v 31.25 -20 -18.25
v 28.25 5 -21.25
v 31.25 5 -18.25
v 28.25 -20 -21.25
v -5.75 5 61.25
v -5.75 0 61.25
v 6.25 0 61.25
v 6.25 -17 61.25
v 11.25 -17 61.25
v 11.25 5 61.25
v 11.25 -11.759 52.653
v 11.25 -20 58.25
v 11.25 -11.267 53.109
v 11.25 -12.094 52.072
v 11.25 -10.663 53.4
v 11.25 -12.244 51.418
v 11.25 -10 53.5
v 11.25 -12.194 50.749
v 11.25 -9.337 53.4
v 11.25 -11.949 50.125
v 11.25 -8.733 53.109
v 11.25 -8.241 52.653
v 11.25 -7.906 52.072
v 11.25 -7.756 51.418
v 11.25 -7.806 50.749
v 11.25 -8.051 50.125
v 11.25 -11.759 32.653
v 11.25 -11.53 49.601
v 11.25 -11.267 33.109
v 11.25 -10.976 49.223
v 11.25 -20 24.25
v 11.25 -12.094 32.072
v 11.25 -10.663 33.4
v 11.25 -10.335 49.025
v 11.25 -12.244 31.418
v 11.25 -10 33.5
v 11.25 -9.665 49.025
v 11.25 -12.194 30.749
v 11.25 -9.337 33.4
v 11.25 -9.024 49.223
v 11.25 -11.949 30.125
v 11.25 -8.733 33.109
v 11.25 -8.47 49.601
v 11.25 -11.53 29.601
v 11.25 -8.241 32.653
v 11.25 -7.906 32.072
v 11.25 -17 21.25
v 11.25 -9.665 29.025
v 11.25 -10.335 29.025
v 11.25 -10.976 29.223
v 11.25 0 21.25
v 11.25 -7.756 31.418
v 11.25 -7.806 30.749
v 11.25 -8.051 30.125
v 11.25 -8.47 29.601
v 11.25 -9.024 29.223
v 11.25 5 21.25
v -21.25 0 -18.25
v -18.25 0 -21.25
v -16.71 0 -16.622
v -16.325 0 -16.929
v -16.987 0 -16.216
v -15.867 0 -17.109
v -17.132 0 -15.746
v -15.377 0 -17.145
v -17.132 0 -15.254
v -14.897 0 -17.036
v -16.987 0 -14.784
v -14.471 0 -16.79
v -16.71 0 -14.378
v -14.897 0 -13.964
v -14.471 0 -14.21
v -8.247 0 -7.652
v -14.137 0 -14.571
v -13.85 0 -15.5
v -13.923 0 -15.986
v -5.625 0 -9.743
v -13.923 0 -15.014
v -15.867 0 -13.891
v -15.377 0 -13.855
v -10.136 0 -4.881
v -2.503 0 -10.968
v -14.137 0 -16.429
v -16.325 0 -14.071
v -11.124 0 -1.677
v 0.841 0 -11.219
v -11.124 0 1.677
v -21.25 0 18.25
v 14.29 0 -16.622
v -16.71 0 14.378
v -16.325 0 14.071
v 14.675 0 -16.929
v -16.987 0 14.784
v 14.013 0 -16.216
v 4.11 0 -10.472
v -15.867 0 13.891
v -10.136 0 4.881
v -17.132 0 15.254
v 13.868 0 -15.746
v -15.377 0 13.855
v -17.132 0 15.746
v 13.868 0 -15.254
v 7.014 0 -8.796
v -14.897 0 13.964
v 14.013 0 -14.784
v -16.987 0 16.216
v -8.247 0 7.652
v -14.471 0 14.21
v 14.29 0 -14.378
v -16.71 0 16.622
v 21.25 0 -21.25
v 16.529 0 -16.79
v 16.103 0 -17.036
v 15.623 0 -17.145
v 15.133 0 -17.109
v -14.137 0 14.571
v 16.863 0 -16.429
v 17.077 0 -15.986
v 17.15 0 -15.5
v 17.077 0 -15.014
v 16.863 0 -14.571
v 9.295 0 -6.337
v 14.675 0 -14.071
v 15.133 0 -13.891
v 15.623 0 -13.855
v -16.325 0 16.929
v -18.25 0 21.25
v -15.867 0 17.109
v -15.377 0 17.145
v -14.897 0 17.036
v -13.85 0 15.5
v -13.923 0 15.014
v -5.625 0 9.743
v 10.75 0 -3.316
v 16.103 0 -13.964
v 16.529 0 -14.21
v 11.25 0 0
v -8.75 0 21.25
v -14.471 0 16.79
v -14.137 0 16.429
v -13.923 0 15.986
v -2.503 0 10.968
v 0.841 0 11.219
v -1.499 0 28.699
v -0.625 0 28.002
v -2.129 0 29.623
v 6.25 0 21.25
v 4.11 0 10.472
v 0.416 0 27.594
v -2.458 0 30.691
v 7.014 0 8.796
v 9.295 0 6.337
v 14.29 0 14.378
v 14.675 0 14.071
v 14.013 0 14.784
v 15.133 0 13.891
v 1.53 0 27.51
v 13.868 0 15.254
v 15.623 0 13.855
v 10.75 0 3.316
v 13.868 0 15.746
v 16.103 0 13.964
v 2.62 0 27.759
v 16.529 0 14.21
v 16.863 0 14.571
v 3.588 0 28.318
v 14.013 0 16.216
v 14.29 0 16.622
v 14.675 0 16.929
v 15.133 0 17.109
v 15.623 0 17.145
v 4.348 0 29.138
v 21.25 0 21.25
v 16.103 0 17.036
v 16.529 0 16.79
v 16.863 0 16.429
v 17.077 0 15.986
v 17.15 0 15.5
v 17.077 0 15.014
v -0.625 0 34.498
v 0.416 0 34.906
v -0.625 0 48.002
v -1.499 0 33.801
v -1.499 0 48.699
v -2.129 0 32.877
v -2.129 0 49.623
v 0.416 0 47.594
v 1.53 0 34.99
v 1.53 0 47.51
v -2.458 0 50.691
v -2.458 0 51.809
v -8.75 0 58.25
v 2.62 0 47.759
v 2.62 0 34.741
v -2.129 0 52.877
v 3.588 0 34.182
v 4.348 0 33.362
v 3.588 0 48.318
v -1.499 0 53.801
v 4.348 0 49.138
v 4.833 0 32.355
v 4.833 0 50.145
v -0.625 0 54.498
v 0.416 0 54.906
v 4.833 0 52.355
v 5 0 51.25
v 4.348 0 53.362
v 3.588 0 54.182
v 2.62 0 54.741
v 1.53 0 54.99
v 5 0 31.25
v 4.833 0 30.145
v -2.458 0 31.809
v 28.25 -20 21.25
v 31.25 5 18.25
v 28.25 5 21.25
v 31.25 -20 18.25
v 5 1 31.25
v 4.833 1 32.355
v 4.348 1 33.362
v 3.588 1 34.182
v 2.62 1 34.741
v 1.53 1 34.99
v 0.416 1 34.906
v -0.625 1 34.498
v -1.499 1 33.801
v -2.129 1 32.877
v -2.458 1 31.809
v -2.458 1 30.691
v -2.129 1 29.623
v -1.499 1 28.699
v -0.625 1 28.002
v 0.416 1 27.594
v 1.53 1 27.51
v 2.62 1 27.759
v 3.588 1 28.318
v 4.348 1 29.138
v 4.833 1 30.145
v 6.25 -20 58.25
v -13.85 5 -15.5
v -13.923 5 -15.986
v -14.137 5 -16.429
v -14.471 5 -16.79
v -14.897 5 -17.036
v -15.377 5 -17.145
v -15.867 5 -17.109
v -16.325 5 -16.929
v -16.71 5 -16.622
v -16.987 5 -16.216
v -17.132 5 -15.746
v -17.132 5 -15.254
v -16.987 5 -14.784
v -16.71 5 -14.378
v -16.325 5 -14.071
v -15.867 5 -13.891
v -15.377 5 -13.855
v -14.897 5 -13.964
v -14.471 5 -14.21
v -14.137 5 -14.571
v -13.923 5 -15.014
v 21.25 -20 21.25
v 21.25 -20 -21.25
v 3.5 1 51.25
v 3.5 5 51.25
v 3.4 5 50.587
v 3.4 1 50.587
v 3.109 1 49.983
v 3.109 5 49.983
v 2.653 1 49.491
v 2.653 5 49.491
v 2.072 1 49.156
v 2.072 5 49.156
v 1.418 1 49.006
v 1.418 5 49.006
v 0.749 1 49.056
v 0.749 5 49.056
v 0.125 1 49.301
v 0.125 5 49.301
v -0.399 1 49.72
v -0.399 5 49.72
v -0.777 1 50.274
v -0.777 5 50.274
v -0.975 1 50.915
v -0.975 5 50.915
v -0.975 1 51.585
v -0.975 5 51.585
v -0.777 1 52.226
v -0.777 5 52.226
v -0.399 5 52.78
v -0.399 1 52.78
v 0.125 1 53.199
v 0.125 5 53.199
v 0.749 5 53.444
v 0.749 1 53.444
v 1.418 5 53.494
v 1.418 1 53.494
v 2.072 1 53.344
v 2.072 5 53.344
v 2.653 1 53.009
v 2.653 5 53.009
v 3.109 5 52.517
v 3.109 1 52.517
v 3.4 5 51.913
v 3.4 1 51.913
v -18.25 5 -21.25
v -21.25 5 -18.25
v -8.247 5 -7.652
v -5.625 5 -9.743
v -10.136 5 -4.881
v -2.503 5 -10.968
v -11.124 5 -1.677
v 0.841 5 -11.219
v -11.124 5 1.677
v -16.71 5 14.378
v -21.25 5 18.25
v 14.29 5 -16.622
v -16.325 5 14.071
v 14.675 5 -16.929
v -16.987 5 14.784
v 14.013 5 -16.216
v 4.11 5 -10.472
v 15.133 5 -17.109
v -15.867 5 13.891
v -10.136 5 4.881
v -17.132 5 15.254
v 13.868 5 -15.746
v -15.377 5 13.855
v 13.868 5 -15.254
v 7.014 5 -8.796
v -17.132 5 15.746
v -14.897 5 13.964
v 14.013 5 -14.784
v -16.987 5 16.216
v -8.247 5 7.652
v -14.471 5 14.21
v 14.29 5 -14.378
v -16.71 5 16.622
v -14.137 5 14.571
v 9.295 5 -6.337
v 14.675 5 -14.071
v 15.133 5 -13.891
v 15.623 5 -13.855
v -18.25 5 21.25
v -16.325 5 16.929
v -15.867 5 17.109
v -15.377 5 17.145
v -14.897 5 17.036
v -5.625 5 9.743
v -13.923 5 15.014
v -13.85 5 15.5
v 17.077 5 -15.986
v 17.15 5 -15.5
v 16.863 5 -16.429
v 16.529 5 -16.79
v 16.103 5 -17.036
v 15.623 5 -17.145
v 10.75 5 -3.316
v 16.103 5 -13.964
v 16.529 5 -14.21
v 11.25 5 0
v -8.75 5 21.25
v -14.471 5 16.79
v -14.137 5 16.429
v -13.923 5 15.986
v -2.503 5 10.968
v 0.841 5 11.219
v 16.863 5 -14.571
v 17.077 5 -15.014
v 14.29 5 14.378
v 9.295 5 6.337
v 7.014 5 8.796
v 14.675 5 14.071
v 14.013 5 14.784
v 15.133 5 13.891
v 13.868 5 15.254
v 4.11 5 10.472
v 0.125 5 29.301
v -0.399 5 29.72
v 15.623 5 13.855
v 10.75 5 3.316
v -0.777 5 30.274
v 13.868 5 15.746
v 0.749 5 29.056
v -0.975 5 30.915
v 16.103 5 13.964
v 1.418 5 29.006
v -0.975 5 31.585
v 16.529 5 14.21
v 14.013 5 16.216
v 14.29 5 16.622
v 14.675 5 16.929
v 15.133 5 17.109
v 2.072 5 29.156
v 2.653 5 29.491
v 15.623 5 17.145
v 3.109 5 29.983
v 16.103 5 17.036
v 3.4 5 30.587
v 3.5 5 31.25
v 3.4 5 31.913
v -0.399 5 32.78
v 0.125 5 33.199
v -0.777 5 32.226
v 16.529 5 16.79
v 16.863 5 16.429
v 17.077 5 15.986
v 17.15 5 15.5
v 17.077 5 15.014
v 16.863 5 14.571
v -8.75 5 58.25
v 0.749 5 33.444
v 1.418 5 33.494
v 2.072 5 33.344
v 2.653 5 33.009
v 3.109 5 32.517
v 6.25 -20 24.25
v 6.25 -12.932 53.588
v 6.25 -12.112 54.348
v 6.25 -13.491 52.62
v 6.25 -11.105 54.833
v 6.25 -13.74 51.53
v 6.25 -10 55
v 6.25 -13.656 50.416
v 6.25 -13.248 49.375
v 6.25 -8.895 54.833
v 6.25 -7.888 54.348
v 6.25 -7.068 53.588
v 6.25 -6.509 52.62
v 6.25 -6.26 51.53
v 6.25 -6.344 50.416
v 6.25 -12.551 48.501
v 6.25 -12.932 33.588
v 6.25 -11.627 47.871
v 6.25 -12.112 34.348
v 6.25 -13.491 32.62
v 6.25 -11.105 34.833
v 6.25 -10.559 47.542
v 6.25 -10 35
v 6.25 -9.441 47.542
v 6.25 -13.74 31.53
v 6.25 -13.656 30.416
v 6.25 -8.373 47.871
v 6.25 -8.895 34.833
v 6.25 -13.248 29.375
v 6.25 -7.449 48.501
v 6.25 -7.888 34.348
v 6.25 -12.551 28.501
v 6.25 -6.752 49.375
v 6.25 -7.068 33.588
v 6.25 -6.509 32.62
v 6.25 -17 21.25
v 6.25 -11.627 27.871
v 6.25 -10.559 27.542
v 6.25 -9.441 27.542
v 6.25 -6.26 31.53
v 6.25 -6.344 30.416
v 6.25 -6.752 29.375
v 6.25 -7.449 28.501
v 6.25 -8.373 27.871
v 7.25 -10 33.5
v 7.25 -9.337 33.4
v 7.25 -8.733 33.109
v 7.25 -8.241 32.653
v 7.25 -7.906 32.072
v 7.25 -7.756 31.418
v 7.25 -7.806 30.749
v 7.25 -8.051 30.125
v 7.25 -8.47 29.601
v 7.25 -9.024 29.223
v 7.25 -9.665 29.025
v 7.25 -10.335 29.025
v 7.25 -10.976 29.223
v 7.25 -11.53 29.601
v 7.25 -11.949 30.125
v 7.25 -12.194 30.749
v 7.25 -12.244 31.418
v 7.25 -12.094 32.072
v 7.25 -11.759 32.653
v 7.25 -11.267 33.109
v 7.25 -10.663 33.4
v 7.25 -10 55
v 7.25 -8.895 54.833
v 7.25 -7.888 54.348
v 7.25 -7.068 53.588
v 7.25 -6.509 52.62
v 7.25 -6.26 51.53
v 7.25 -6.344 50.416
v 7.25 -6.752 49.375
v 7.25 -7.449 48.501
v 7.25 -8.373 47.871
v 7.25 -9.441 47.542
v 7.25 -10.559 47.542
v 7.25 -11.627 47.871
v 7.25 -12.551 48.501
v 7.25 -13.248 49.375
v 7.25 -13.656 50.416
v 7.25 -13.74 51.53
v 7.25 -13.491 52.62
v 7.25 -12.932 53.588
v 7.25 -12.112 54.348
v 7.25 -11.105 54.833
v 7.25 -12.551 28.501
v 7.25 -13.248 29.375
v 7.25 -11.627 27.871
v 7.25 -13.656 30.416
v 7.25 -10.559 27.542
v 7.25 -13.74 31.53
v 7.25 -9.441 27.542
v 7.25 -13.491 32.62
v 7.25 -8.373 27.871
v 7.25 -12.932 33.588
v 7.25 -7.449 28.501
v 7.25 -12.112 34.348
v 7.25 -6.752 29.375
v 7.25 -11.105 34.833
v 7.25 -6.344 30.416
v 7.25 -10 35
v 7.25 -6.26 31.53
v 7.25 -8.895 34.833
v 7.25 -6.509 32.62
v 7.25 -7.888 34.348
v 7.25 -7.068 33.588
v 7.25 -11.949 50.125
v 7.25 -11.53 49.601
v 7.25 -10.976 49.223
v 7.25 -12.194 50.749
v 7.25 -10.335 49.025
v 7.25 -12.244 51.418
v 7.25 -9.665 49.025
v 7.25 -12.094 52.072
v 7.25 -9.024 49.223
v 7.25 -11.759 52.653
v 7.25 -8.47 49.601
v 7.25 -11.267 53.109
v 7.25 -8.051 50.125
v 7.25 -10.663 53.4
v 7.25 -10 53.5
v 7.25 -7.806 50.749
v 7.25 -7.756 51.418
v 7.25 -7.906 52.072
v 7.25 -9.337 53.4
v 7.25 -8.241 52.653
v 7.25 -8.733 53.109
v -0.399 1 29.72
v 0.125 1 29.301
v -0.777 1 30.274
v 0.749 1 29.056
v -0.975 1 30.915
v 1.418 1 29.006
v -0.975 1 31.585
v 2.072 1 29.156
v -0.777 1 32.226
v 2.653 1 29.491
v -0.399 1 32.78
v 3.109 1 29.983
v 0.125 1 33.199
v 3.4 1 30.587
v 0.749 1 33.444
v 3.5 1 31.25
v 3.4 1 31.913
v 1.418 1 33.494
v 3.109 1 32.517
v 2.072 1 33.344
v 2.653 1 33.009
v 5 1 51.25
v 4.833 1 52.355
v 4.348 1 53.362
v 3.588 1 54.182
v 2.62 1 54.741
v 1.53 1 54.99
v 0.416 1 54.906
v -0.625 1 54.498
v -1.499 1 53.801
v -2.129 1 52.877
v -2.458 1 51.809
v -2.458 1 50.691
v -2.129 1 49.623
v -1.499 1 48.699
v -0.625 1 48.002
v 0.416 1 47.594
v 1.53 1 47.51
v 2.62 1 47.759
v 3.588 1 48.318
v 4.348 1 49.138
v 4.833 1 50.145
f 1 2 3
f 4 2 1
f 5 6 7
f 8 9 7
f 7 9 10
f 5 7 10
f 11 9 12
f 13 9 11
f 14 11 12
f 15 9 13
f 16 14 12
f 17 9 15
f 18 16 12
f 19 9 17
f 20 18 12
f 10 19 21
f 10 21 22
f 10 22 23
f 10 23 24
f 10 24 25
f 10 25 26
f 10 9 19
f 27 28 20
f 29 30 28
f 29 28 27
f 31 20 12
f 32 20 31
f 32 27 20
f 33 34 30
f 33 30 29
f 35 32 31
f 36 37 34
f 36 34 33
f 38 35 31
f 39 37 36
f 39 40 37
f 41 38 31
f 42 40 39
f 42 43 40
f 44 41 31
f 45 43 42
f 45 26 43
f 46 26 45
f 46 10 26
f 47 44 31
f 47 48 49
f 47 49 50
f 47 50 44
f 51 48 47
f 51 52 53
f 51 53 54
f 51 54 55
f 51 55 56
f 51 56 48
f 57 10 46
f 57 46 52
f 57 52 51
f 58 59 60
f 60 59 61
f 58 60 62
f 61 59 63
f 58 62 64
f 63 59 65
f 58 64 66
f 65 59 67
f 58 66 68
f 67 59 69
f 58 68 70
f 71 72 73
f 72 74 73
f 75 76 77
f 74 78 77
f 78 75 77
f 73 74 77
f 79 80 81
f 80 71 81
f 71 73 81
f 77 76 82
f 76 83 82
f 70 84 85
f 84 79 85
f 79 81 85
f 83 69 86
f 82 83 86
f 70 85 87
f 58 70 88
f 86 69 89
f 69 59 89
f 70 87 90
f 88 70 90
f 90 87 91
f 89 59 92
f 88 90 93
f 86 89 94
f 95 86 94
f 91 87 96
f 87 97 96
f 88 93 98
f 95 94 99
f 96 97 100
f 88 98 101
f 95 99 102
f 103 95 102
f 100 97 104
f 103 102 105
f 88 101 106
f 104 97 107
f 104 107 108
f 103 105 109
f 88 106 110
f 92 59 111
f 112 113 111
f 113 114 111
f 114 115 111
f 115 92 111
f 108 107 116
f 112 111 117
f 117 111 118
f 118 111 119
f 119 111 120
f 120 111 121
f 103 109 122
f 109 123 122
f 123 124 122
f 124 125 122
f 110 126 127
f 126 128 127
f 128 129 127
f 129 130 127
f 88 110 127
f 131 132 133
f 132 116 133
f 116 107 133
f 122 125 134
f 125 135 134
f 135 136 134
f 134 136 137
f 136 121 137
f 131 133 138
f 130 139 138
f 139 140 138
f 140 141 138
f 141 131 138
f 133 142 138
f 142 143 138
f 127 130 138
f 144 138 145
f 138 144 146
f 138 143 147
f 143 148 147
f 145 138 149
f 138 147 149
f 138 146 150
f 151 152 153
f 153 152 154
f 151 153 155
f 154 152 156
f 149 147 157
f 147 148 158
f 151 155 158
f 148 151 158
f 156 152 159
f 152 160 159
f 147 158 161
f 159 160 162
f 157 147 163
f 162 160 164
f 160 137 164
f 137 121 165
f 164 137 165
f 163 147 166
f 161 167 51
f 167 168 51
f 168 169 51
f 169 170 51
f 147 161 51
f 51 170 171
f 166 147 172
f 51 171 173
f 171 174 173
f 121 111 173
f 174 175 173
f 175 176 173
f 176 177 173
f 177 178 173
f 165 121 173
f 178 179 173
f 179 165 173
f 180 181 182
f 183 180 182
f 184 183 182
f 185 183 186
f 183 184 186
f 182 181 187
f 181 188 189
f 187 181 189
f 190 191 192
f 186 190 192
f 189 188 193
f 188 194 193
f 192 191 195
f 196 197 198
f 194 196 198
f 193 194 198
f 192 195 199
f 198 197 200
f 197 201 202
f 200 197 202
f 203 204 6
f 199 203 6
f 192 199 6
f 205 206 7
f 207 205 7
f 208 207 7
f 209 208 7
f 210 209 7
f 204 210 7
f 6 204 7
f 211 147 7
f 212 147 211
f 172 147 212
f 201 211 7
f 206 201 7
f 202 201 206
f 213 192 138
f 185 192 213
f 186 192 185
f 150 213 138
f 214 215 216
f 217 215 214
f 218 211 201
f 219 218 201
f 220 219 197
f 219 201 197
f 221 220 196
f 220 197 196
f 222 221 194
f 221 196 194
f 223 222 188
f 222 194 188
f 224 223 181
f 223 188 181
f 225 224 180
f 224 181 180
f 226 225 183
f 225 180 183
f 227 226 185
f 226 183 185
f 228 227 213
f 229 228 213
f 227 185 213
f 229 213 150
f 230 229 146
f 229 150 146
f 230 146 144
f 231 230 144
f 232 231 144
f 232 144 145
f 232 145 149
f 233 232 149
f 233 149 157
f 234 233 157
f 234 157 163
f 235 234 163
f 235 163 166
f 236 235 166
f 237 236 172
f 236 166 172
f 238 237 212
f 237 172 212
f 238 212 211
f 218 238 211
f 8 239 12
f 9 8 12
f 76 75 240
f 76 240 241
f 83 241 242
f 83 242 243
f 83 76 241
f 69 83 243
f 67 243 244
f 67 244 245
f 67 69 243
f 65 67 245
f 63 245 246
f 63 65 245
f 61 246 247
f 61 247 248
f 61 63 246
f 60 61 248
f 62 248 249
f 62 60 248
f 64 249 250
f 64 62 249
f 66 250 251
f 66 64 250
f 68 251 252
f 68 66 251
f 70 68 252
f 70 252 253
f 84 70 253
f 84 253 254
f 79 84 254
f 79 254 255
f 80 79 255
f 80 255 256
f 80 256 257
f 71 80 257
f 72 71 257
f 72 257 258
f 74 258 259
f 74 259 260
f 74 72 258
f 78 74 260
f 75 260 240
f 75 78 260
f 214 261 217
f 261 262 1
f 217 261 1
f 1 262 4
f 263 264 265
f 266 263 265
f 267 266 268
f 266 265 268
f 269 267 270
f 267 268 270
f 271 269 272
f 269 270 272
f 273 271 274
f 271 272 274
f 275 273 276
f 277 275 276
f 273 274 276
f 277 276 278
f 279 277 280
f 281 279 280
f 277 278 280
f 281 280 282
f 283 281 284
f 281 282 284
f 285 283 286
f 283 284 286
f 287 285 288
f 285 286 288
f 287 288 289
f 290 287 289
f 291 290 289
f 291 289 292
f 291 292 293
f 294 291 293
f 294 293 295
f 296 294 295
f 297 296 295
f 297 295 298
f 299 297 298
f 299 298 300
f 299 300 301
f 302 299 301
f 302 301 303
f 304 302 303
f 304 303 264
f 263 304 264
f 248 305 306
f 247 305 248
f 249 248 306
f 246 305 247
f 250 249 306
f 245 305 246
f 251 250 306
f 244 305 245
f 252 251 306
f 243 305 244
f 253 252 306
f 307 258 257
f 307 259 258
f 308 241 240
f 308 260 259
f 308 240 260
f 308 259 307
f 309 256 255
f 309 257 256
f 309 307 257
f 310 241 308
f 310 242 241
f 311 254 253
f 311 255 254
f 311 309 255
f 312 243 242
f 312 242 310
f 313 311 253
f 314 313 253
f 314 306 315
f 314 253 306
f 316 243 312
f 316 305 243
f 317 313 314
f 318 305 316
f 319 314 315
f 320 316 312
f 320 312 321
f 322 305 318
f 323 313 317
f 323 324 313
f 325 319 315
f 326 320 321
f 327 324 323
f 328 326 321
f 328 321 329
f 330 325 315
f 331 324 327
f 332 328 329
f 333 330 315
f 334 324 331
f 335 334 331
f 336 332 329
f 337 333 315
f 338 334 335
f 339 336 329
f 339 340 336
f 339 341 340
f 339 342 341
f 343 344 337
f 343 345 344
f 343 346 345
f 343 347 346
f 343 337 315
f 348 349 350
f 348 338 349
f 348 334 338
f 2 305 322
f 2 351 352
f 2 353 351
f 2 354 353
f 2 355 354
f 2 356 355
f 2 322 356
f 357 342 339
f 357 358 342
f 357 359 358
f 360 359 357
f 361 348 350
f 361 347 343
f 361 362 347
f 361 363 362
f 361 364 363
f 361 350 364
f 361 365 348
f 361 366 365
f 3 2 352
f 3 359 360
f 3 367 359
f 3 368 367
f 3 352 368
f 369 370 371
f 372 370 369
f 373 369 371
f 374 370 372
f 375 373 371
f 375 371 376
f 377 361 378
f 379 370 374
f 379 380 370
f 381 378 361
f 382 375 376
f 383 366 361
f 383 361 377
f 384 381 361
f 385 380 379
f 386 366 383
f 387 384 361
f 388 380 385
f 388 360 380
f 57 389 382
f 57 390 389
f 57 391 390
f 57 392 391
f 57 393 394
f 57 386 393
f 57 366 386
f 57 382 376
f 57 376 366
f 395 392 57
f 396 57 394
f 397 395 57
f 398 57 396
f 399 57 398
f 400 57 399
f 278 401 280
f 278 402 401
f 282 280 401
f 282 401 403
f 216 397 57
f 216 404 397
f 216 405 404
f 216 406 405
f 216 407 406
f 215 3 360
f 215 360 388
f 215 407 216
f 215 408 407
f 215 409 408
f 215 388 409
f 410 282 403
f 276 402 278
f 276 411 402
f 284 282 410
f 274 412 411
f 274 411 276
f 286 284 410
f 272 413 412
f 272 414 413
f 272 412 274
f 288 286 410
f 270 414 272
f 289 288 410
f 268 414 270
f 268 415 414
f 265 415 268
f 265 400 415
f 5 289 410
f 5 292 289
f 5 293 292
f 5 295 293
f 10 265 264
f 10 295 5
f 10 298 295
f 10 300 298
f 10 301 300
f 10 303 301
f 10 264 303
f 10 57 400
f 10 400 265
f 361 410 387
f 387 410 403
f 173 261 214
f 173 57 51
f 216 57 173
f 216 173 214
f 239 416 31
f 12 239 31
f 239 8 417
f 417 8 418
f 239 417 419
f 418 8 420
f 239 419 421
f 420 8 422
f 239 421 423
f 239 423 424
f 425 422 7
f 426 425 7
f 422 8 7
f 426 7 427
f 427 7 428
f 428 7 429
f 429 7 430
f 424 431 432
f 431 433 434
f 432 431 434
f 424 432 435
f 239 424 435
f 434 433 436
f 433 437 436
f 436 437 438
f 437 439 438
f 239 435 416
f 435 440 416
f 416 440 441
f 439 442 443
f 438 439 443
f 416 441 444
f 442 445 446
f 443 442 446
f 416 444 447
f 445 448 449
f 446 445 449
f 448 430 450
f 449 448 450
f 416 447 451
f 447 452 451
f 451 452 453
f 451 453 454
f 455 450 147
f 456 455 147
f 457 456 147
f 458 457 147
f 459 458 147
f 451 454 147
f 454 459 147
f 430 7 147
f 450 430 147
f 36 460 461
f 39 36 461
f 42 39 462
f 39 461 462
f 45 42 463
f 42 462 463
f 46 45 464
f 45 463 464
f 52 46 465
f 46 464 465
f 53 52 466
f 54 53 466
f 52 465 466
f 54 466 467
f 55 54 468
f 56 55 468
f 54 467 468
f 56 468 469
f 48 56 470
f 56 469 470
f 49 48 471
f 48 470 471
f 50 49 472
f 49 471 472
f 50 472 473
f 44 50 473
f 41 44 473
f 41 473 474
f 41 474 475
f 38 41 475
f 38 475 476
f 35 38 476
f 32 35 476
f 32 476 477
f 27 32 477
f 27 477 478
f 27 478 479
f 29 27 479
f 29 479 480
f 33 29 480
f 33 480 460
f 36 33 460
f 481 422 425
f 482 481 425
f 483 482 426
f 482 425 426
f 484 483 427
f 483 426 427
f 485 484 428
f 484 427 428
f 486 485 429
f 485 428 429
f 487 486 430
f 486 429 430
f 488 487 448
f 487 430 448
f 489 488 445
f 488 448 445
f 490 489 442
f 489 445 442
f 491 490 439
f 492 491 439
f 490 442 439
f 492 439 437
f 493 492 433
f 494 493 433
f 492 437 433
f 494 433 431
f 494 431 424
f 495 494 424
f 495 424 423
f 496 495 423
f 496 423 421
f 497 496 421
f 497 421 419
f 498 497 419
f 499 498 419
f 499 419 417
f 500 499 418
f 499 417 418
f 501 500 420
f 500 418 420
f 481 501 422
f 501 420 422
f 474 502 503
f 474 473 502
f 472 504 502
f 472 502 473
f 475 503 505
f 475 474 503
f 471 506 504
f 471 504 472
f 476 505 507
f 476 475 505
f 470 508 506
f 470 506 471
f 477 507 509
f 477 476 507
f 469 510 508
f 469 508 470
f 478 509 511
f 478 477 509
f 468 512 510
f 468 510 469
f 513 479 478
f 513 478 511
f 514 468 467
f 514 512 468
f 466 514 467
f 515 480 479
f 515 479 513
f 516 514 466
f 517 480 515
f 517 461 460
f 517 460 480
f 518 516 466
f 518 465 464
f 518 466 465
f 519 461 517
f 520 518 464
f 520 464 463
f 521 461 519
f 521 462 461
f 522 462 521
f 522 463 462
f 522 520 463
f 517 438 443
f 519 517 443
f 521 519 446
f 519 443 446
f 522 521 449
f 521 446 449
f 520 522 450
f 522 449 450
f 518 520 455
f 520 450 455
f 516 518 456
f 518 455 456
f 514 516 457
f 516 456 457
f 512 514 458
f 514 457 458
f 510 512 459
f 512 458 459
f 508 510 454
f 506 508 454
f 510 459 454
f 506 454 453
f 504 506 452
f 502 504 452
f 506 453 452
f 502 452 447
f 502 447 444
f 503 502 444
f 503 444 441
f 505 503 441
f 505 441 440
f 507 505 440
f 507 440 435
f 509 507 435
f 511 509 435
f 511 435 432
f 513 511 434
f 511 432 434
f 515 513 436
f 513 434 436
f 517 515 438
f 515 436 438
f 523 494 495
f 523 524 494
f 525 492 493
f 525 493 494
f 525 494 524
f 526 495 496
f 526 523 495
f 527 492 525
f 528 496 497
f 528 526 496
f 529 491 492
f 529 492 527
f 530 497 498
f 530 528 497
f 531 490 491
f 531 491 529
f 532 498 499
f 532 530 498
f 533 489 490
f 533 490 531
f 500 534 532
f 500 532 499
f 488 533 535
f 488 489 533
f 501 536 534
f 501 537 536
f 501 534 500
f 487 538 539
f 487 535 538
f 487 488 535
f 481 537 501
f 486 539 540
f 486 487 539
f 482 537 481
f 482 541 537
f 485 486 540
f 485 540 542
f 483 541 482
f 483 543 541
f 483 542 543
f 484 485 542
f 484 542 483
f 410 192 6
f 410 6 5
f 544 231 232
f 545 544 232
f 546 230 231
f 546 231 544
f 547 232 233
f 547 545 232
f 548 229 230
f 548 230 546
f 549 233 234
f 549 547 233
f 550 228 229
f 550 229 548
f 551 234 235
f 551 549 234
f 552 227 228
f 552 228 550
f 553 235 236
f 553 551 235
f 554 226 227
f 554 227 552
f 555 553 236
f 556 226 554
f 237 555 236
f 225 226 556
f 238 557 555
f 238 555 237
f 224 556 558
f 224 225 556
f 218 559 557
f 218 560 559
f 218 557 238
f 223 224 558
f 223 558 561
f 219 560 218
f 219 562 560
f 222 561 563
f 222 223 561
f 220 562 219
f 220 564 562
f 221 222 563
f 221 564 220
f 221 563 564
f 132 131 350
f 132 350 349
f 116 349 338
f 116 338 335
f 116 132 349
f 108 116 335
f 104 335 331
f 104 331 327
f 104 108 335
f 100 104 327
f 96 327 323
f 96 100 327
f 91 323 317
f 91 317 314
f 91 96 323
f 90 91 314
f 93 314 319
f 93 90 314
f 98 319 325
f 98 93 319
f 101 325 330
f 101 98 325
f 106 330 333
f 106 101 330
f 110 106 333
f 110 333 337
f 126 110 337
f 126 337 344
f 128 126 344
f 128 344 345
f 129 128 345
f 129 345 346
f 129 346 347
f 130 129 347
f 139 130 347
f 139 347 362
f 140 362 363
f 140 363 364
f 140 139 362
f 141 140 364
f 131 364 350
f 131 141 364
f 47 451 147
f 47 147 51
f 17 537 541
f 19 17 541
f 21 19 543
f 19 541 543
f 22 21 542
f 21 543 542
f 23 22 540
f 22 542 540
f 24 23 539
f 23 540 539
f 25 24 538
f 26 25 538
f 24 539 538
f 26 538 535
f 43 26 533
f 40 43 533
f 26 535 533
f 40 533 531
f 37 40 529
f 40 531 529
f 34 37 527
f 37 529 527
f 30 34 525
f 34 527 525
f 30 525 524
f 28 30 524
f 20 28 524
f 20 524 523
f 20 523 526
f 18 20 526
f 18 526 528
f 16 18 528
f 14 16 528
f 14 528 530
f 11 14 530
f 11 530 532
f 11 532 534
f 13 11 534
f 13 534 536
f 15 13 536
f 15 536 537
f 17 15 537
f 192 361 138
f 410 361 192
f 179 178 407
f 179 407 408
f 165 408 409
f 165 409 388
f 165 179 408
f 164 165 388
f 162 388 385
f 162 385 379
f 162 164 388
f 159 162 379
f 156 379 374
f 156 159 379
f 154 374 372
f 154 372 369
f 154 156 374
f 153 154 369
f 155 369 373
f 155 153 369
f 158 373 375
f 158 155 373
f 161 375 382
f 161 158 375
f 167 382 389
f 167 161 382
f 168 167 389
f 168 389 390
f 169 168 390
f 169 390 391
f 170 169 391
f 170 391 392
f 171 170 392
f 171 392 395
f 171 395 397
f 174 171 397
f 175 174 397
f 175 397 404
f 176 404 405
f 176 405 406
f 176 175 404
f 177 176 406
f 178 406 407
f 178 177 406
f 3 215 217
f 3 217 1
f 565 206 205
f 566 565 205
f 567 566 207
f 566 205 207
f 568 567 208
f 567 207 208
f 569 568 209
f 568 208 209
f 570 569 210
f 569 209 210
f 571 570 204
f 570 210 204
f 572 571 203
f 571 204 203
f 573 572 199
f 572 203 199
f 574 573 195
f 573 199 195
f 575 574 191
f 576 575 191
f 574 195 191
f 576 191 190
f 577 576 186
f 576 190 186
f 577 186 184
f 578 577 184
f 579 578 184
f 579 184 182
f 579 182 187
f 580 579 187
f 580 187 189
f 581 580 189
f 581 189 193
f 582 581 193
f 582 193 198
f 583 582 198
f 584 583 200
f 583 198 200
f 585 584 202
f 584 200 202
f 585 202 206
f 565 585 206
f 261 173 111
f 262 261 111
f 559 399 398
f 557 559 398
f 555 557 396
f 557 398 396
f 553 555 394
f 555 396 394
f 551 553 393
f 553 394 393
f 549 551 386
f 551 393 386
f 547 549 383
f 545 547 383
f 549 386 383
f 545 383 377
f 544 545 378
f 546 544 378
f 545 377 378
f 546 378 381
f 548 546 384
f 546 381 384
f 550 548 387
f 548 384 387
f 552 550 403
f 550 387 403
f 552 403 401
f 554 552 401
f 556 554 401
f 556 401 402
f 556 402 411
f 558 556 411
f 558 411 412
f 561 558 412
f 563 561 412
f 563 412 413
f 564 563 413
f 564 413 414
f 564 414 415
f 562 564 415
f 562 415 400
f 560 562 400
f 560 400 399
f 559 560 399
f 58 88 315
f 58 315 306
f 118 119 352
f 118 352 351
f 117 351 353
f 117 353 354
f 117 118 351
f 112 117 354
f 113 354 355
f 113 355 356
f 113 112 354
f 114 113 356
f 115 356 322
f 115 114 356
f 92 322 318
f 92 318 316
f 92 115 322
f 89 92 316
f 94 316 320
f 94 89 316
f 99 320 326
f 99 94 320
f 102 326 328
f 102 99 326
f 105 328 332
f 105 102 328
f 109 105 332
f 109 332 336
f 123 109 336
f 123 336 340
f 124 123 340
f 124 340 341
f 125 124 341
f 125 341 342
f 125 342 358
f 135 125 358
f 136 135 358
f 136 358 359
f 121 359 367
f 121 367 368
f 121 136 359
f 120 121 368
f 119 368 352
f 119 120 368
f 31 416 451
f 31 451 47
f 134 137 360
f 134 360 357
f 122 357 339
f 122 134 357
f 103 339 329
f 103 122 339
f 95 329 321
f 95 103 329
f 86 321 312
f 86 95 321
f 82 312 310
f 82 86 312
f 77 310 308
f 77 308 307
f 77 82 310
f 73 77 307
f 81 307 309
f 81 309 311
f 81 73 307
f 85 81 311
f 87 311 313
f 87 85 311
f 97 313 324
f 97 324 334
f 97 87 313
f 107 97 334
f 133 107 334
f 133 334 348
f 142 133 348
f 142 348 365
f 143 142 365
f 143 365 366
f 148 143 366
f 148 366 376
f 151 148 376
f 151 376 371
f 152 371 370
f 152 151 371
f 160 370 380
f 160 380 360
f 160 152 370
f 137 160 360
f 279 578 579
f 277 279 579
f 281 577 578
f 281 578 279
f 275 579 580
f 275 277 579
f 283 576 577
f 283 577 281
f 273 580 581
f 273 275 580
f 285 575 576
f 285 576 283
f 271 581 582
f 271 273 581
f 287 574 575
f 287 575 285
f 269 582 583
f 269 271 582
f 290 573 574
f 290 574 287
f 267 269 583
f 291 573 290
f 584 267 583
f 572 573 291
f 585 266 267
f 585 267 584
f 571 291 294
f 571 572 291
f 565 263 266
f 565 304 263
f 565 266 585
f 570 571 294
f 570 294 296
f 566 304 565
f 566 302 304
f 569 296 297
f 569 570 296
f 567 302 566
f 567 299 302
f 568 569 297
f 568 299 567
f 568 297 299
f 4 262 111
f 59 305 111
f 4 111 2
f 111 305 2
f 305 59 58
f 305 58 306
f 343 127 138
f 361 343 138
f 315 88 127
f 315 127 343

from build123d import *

# Parameters (mm, degrees)
SKETCH1_W           = 42.5
SKETCH1_H           = 42.5
SKETCH1_R           = 11.25
SKETCH1_R_2         = 1.65
BOSS_EXTRUDE1_DEPTH = 5
SKETCH3_W           = 10
SKETCH3_H           = 42.5
SKETCH3_W_2         = 5
SKETCH3_H_2         = 40
BOSS_EXTRUDE2_DEPTH = 25
CHAMFER1_SIZE       = 3
SKETCH5_W           = 40
SKETCH5_H           = 5
BOSS_EXTRUDE3_DEPTH = 15
CUT_EXTRUDE5_REACH  = 27
SKETCH9_R           = 2.25
CUT_EXTRUDE6_REACH  = 27
SKETCH10_R          = 2.25
SKETCH11_R          = 3.75
CUT_EXTRUDE7_DEPTH  = 1
SKETCH12_R          = 3.75
CUT_EXTRUDE8_DEPTH  = 1
CHAMFER2_SIZE       = 3


with BuildPart() as part:
    # Sketch1 → Boss-Extrude1 (new body)
    with BuildSketch(Plane(origin=(0, 0, 0), x_dir=(1, 0, 0), z_dir=(0, 1, 0))):
        Rectangle(SKETCH1_W, SKETCH1_H)
        Circle(SKETCH1_R, mode=Mode.SUBTRACT)
        with Locations((-15.5, 15.5)):
            Circle(SKETCH1_R_2, mode=Mode.SUBTRACT)
        with Locations((15.5, 15.5)):
            Circle(SKETCH1_R_2, mode=Mode.SUBTRACT)
        with Locations((15.5, -15.5)):
            Circle(SKETCH1_R_2, mode=Mode.SUBTRACT)
        with Locations((-15.5, -15.5)):
            Circle(SKETCH1_R_2, mode=Mode.SUBTRACT)
    extrude(amount=BOSS_EXTRUDE1_DEPTH)

    # Sketch3 → Boss-Extrude2 (add)
    with BuildSketch(Plane(origin=(0, 5, 0), x_dir=(1, 0, 0), z_dir=(0, 1, 0))):
        with Locations((26.25, 0)):
            Rectangle(SKETCH3_W, SKETCH3_H)
        with Locations((8.75, -41.25)):
            Rectangle(SKETCH3_W_2, SKETCH3_H_2)
    extrude(amount=-BOSS_EXTRUDE2_DEPTH)

    # Chamfer1
    chamfer1_edges = [part.edges().sort_by_distance(p)[0] for p in [
        (31.25, -7.5, -21.25),
        (31.25, -7.5, 21.25),
        (-21.25, 2.5, 21.25),
        (-21.25, 2.5, -21.25),
    ]]
    chamfer(chamfer1_edges, length=CHAMFER1_SIZE)

    # Sketch5 → Boss-Extrude3 (add)
    with BuildSketch(Plane.ZY.offset(-6.25)):
        with Locations((41.25, 2.5)):
            Rectangle(SKETCH5_W, SKETCH5_H)
    extrude(amount=BOSS_EXTRUDE3_DEPTH)

    # Sketch9 → Cut-Extrude5 (cut, up to next)
    with BuildSketch(Plane(origin=(0, 5, 0), x_dir=(1, 0, 0), z_dir=(0, 1, 0)), mode=Mode.PRIVATE) as cut_extrude5_sk1:
        with Locations((1.25, -51.25)):
            Circle(SKETCH9_R)
    cut_extrude5_tool1 = extrude(cut_extrude5_sk1.sketch, amount=-CUT_EXTRUDE5_REACH, mode=Mode.PRIVATE) & part.part
    add(cut_extrude5_tool1.solids().sort_by_distance((1.25, 5, 51.25))[0], mode=Mode.SUBTRACT)
    # Sketch9 → Cut-Extrude5 (cut, up to next)
    with BuildSketch(Plane(origin=(0, 5, 0), x_dir=(1, 0, 0), z_dir=(0, 1, 0)), mode=Mode.PRIVATE) as cut_extrude5_sk2:
        with Locations((1.25, -31.25)):
            Circle(SKETCH9_R)
    cut_extrude5_tool2 = extrude(cut_extrude5_sk2.sketch, amount=-CUT_EXTRUDE5_REACH, mode=Mode.PRIVATE) & part.part
    add(cut_extrude5_tool2.solids().sort_by_distance((1.25, 5, 31.25))[0], mode=Mode.SUBTRACT)

    # Sketch10 → Cut-Extrude6 (cut, up to next)
    with BuildSketch(Plane.ZY.offset(-6.25), mode=Mode.PRIVATE) as cut_extrude6_sk1:
        with Locations((51.25, -10)):
            Circle(SKETCH10_R)
    cut_extrude6_tool1 = extrude(cut_extrude6_sk1.sketch, amount=-CUT_EXTRUDE6_REACH, mode=Mode.PRIVATE) & part.part
    add(cut_extrude6_tool1.solids().sort_by_distance((6.25, -10, 51.25))[0], mode=Mode.SUBTRACT)
    # Sketch10 → Cut-Extrude6 (cut, up to next)
    with BuildSketch(Plane.ZY.offset(-6.25), mode=Mode.PRIVATE) as cut_extrude6_sk2:
        with Locations((31.25, -10)):
            Circle(SKETCH10_R)
    cut_extrude6_tool2 = extrude(cut_extrude6_sk2.sketch, amount=-CUT_EXTRUDE6_REACH, mode=Mode.PRIVATE) & part.part
    add(cut_extrude6_tool2.solids().sort_by_distance((6.25, -10, 31.25))[0], mode=Mode.SUBTRACT)

    # Sketch11 → Cut-Extrude7 (cut)
    with BuildSketch(Plane.XZ):
        with Locations((1.25, 51.25)):
            Circle(SKETCH11_R)
        with Locations((1.25, 31.25)):
            Circle(SKETCH11_R)
    extrude(amount=-CUT_EXTRUDE7_DEPTH, mode=Mode.SUBTRACT)

    # Sketch12 → Cut-Extrude8 (cut)
    with BuildSketch(Plane.ZY.offset(-6.25)):
        with Locations((31.25, -10)):
            Circle(SKETCH12_R)
        with Locations((51.25, -10)):
            Circle(SKETCH12_R)
    extrude(amount=-CUT_EXTRUDE8_DEPTH, mode=Mode.SUBTRACT)

    # Chamfer2
    chamfer2_edges = [part.edges().sort_by_distance(p)[0] for p in [
        (8.75, -20, 21.25),
        (8.75, -20, 61.25),
        (-8.75, 2.5, 61.25),
    ]]
    chamfer(chamfer2_edges, length=CHAMFER2_SIZE)


solid = part.part
